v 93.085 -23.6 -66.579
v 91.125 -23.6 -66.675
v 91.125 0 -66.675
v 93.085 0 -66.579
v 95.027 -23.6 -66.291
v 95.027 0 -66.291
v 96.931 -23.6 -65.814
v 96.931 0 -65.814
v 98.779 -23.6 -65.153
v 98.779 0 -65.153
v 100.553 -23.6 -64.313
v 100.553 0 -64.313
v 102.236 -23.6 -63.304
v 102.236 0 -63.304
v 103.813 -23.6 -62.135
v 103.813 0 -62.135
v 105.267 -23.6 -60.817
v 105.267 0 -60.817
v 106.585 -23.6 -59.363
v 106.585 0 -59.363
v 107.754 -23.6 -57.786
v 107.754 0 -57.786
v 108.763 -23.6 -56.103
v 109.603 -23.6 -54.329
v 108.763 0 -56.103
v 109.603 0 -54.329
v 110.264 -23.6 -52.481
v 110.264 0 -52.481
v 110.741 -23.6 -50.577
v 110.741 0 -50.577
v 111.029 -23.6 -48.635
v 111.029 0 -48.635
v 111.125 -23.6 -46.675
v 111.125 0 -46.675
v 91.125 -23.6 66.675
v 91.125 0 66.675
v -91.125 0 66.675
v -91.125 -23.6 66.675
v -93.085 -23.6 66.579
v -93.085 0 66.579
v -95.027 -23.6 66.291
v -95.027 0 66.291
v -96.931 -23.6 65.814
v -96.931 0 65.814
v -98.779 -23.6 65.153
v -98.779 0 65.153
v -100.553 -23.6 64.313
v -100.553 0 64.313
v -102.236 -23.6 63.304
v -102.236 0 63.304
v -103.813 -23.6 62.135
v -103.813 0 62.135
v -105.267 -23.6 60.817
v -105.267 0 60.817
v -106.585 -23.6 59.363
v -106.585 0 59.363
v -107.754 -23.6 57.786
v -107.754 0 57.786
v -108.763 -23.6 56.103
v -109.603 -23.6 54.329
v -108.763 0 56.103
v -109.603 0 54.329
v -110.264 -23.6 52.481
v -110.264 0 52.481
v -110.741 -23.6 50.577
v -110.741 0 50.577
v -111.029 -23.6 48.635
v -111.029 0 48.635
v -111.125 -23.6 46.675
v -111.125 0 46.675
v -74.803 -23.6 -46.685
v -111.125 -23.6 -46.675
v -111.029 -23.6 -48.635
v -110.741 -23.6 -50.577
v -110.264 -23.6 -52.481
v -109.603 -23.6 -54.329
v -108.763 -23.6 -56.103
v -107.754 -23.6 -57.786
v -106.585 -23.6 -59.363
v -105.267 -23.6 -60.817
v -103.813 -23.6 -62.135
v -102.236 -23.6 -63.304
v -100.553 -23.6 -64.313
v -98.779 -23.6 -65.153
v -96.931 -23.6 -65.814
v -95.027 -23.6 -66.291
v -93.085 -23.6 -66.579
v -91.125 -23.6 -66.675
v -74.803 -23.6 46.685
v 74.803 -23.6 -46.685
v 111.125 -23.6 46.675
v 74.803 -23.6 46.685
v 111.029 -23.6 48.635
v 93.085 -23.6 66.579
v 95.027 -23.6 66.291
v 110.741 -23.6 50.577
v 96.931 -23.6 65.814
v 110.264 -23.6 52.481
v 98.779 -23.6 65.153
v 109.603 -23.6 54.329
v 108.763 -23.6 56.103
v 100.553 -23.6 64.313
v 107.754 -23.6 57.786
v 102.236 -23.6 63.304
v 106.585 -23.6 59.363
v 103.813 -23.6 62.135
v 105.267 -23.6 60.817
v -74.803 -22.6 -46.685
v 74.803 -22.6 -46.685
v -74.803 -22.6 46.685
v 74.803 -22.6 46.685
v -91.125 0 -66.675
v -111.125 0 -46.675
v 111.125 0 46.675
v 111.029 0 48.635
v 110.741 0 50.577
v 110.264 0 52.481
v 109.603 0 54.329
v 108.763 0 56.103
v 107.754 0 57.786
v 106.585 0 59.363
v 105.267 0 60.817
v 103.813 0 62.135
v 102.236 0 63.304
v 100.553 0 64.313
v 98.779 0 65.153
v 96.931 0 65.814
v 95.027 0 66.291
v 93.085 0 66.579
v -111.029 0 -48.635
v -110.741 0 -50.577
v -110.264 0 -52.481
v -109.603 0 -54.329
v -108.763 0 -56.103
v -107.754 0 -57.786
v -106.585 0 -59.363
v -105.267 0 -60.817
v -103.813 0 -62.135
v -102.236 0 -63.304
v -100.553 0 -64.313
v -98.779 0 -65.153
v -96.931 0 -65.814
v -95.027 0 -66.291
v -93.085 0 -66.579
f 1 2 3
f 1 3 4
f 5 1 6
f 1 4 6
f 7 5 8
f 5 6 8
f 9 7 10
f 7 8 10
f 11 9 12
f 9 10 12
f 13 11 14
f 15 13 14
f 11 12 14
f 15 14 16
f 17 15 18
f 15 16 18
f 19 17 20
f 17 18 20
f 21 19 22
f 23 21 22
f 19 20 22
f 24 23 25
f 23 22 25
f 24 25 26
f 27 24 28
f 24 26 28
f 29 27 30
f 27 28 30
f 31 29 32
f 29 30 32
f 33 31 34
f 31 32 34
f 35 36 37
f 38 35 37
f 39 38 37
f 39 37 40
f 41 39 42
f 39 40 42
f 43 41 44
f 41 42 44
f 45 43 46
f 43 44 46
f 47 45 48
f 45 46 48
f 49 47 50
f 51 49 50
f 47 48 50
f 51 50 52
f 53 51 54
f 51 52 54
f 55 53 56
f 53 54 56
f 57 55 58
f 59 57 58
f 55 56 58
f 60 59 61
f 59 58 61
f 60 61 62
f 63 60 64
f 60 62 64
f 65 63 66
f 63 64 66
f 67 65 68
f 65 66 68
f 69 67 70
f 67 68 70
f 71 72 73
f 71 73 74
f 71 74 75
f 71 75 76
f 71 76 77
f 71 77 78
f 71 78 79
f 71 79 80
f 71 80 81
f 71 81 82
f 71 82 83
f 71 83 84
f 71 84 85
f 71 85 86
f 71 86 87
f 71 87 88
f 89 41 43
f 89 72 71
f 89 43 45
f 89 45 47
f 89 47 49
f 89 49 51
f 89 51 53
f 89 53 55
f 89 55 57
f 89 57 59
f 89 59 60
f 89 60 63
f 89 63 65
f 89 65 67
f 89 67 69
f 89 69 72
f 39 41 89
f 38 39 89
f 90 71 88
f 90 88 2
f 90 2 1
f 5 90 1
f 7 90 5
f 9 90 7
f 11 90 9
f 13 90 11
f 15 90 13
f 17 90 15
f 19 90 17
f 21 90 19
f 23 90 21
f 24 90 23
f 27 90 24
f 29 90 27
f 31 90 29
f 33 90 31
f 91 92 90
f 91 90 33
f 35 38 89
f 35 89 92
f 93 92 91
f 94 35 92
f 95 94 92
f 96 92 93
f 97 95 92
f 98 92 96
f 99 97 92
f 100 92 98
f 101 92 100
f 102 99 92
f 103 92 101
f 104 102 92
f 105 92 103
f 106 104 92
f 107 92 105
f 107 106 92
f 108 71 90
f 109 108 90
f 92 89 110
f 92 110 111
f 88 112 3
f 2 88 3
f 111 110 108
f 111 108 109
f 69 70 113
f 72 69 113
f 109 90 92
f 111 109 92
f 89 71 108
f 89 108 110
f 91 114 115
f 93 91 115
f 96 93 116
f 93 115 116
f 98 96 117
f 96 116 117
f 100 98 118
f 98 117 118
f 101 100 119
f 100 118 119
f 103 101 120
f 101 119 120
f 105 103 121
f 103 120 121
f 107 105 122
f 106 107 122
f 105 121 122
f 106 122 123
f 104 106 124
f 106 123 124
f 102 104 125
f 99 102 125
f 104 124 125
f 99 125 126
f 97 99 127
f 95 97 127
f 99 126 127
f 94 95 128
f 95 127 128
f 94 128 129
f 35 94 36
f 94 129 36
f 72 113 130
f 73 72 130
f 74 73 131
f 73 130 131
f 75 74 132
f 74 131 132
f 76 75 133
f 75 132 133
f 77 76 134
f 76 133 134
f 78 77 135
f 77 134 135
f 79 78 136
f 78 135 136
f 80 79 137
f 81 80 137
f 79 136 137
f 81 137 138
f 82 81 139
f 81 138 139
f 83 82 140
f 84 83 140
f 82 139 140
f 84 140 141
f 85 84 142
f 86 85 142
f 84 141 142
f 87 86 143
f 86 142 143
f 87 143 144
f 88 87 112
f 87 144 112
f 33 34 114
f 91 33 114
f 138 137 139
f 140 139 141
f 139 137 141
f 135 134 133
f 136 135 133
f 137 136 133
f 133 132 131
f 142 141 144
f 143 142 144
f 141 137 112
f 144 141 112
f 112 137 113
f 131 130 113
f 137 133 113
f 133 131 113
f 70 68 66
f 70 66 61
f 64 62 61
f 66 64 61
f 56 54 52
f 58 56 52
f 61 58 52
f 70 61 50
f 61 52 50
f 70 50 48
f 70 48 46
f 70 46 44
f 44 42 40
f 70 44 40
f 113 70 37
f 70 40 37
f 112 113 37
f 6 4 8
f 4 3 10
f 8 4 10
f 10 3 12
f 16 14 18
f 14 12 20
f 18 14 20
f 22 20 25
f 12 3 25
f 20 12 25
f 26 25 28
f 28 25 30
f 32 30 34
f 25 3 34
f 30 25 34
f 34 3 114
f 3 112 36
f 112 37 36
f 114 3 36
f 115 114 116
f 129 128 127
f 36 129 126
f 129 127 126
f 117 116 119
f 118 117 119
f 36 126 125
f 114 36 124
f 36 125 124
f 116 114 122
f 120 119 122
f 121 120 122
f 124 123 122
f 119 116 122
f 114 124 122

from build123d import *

# Parameters (mm, degrees)
F1_DEPTH = 23.6
F2_W     = 149.606
F2_H     = 93.3704
F3_DEPTH = 1


with BuildPart() as f1:
    # F0 (on Front) → F1 (new body)
    with BuildSketch(Plane.XZ):
        with BuildLine():
            Line((91.125, 66.675), (-91.125, 66.675))
            ThreePointArc((-91.125, 66.675), (-105.267136, 60.817136), (-111.125, 46.675))
            Line((-111.125, 46.675), (-111.125, -46.675))
            ThreePointArc((-111.125, -46.675), (-105.267136, -60.817136), (-91.125, -66.675))
            Line((-91.125, -66.675), (91.125, -66.675))
            ThreePointArc((91.125, -66.675), (105.267136, -60.817136), (111.125, -46.675))
            Line((111.125, -46.675), (111.125, 46.675))
            ThreePointArc((111.125, 46.675), (105.267136, 60.817136), (91.125, 66.675))
        make_face()
    extrude(amount=F1_DEPTH)

    # F2 (on face) → F3 (cut)
    with BuildSketch(Plane.XZ.offset(23.6)):
        Rectangle(F2_W, F2_H)
    extrude(amount=-F3_DEPTH, mode=Mode.SUBTRACT)


solid = f1.part
